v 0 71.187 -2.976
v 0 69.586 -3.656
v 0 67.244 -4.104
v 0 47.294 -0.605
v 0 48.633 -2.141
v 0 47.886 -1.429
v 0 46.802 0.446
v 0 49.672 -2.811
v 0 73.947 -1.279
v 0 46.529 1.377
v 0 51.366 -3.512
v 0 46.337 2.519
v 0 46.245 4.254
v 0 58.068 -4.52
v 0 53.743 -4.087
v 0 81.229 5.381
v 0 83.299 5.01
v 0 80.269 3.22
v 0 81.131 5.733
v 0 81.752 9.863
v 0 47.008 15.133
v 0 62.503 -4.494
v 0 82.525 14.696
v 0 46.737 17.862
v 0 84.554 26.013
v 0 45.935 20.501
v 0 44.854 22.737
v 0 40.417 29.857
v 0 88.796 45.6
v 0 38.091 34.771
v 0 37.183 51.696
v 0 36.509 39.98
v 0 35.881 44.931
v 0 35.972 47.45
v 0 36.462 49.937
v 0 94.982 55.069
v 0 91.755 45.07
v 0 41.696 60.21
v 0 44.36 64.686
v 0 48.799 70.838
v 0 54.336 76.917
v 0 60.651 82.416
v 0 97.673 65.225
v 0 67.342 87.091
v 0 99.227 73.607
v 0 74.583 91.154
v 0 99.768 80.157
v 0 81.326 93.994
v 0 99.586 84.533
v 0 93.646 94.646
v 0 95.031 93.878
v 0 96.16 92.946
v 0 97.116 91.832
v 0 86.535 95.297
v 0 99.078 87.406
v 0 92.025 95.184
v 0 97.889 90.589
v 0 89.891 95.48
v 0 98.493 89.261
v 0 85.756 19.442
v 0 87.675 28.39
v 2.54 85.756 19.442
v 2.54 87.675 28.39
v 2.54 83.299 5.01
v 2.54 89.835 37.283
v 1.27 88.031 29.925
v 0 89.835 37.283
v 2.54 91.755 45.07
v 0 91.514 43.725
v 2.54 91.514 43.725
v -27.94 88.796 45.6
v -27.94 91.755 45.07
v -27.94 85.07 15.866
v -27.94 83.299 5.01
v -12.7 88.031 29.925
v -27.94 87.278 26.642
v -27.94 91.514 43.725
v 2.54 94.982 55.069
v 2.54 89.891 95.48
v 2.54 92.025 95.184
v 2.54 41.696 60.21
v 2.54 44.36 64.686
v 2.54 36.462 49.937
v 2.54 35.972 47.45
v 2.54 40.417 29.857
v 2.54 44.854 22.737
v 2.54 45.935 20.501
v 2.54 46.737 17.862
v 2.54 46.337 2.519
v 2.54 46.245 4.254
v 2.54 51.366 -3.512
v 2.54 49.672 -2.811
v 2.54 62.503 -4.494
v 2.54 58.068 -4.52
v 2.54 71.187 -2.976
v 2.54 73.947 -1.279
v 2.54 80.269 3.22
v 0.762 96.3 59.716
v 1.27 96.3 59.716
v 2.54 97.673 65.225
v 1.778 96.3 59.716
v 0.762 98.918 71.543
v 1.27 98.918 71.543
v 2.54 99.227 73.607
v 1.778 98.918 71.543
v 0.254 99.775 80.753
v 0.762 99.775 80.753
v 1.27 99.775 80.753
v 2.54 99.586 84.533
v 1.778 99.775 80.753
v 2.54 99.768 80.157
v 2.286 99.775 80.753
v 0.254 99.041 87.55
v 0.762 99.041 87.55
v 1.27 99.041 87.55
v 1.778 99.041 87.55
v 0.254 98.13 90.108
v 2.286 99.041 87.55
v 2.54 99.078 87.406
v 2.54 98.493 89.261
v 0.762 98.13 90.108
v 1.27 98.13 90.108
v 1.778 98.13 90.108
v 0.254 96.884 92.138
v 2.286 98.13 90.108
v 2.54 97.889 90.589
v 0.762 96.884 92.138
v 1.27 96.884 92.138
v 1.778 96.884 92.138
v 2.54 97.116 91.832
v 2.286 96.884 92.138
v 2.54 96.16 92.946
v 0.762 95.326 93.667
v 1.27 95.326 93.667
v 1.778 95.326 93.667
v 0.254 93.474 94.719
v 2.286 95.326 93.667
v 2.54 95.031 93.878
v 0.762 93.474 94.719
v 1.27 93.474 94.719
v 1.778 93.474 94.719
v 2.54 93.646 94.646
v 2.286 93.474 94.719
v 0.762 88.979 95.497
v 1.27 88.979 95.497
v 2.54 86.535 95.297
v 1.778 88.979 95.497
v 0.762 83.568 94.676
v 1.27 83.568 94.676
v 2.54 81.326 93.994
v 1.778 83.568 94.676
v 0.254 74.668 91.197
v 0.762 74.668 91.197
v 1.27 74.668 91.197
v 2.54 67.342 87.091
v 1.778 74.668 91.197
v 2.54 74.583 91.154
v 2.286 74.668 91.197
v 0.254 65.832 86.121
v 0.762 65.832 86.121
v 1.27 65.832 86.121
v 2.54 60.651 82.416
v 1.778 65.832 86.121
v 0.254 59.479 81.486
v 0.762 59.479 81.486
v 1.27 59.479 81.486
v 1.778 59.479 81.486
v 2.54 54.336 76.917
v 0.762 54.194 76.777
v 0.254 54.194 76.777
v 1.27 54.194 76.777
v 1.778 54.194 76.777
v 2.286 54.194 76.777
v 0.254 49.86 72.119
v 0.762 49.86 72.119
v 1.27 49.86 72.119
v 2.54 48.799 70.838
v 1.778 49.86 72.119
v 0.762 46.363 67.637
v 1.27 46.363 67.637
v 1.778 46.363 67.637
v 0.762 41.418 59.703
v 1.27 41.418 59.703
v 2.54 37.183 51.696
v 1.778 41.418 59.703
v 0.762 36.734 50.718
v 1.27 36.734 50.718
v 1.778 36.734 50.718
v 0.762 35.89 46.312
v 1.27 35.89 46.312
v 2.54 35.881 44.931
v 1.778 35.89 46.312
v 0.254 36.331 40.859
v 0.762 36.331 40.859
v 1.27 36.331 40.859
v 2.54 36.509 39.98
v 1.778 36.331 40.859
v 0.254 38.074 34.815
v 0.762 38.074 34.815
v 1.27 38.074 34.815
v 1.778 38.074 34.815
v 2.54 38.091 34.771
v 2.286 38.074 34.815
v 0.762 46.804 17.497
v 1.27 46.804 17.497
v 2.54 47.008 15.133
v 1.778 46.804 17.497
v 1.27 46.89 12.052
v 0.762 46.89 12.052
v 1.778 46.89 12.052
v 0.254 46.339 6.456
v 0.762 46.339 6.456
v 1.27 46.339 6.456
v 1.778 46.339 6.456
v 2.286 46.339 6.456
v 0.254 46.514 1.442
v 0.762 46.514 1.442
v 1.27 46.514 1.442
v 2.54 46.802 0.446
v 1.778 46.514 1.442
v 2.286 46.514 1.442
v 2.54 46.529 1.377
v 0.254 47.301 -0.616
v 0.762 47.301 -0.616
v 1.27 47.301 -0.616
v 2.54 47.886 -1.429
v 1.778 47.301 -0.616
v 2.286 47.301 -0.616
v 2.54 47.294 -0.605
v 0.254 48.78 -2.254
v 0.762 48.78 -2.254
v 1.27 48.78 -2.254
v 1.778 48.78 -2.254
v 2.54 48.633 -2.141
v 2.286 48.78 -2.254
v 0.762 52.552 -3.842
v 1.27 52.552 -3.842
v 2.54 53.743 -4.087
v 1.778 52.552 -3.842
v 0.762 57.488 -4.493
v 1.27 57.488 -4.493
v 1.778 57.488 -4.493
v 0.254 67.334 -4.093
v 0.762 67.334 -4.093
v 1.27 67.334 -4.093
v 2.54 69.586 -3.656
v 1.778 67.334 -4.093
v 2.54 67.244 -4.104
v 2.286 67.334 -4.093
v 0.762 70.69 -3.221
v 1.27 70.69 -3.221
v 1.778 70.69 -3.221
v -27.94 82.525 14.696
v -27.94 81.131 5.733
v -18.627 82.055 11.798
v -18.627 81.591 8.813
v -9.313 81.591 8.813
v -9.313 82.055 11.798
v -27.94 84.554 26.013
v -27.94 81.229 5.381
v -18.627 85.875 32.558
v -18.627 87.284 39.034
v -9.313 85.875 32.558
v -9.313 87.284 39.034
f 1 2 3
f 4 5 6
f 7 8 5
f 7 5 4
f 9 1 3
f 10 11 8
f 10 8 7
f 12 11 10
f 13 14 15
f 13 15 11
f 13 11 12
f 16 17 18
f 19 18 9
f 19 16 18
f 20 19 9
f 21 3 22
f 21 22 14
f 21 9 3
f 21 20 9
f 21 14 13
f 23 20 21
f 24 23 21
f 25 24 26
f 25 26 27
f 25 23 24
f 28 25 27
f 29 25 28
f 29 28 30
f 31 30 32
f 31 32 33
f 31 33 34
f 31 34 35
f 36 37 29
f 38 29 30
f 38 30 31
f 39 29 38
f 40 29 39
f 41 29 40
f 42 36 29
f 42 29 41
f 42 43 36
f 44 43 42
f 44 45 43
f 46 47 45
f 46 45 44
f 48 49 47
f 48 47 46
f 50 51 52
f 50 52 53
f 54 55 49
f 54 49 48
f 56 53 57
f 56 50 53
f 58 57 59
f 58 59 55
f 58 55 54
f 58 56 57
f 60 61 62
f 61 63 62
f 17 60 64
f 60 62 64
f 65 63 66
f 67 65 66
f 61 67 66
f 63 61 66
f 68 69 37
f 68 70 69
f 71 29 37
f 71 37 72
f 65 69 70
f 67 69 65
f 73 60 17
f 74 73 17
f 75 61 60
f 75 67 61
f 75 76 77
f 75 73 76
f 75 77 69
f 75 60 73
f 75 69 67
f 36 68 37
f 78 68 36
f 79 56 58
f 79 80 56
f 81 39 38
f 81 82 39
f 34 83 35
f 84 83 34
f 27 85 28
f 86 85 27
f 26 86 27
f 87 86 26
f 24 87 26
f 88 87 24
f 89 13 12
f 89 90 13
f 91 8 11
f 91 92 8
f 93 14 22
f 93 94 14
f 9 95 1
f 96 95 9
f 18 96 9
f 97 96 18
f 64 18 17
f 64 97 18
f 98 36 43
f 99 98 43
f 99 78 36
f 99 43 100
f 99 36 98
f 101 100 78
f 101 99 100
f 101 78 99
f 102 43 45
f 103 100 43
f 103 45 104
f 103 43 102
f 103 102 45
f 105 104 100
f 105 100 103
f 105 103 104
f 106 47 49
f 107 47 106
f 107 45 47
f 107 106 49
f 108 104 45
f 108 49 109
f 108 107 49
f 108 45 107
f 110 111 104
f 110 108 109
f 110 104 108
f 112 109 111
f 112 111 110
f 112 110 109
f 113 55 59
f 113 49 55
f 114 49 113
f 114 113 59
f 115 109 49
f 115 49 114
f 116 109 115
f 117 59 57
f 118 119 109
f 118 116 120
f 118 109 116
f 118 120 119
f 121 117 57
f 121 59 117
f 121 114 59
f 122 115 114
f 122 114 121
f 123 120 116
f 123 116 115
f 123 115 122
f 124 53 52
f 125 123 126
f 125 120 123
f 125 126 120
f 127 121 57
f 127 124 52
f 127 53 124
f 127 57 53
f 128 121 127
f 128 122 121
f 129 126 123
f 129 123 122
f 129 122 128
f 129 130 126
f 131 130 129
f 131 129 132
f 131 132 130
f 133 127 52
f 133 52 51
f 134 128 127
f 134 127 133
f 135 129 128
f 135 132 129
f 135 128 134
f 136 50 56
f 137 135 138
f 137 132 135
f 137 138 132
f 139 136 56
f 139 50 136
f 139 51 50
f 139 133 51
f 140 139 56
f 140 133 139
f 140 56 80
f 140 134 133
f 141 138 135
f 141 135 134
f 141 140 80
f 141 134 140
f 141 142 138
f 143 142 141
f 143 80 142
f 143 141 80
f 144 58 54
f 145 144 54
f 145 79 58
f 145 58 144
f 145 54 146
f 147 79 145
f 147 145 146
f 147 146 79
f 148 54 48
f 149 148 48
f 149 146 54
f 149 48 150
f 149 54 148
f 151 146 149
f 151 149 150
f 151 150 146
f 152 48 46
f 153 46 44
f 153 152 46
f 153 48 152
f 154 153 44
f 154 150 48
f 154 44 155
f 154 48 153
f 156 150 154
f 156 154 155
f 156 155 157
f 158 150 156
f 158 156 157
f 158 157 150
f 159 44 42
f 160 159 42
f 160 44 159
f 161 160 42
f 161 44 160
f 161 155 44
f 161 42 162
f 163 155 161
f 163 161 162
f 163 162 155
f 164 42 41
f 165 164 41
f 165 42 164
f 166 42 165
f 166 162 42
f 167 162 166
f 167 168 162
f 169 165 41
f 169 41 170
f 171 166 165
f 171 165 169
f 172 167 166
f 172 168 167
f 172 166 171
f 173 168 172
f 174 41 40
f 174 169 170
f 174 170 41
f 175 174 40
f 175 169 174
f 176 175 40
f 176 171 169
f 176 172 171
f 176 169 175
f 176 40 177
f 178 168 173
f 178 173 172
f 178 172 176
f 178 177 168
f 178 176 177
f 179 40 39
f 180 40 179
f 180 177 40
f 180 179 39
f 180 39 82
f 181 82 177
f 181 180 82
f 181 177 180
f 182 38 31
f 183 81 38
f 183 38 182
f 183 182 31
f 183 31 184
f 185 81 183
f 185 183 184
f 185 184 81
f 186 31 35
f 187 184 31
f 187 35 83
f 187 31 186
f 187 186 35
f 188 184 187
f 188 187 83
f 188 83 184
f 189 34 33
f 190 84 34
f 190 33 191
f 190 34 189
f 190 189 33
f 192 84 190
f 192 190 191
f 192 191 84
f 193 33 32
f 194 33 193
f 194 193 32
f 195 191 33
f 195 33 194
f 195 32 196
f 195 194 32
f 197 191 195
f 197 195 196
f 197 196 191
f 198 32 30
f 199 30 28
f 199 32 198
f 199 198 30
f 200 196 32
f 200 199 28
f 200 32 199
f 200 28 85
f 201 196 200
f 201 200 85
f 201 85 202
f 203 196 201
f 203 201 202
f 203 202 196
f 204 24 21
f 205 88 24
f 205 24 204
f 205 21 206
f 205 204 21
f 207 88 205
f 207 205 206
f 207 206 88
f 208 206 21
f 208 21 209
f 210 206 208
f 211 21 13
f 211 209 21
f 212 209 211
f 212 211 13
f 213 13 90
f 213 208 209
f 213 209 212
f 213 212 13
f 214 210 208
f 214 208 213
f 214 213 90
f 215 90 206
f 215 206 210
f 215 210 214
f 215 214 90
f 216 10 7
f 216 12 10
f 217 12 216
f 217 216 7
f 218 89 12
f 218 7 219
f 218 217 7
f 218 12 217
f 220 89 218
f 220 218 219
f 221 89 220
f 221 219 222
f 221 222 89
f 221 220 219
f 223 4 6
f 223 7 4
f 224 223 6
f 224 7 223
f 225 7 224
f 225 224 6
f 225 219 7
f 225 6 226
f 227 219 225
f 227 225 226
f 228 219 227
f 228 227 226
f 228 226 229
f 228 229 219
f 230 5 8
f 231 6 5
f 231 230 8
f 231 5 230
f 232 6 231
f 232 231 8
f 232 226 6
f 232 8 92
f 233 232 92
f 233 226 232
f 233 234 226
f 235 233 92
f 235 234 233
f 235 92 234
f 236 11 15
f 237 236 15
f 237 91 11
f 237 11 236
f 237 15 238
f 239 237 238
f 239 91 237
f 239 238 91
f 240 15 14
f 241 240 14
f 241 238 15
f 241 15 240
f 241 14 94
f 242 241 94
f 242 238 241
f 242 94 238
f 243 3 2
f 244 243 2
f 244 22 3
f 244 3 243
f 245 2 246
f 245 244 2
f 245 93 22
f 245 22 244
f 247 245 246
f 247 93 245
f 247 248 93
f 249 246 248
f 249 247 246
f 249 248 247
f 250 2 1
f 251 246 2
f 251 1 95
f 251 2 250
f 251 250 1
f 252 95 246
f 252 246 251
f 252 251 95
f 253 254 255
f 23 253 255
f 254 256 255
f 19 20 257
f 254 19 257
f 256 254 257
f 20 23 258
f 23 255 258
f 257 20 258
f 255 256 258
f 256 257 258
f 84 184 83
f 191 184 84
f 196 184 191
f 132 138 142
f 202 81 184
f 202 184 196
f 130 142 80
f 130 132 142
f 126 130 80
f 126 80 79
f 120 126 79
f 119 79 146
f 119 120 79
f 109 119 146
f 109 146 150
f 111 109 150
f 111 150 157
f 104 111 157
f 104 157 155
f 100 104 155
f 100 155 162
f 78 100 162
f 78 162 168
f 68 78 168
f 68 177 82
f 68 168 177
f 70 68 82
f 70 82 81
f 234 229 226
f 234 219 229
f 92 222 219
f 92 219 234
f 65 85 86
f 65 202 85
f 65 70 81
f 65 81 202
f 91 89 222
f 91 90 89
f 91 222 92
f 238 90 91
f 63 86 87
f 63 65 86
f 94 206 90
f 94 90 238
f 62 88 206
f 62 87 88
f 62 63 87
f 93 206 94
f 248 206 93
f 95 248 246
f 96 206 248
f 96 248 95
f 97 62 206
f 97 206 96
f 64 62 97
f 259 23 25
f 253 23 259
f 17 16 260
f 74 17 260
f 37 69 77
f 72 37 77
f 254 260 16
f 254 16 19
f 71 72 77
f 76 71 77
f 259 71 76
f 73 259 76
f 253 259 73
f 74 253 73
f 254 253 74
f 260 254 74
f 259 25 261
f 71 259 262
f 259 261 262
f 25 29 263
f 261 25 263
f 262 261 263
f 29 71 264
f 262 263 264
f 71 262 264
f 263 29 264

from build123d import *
from OCP.BRepAlgoAPI import BRepAlgoAPI_Cut
from OCP.TopTools import TopTools_ListOfShape

# Parameters (mm, degrees)
SKETCH5_W               = 81.787290023
SKETCH5_H               = 56.904635677
BOSS_EXTRUDE4_DEPTH     = 2.54
SKETCH8_W               = 27.940001339
SKETCH8_H               = 40.923748046
BOSS_EXTRUDE5_DEPTH     = 3.725366
CUT_EXTRUDE1_DEPTH      = 126.746493029
CUT_EXTRUDE1_DEPTH_BACK = 126.746493029
CUT_EXTRUDE2_DEPTH      = 127.33513904
CUT_EXTRUDE2_DEPTH_BACK = 127.33513904
BOSS_EXTRUDE6_REACH     = 128.584
SKETCH12_W              = 2.54
SKETCH12_H              = 35.085594769
BOSS_EXTRUDE7_REACH     = 73.221
SKETCH13_W              = 2.54
SKETCH13_H              = 27.369624292
BOSS_EXTRUDE8_REACH     = 111.618
SKETCH14_W              = 2.54
SKETCH14_H              = 37.73907017
BOSS_EXTRUDE9_REACH     = 134.62
BOSS_EXTRUDE10_REACH    = 73.568
SKETCH16_W              = 2.54
SKETCH16_H              = 4.106837018
CUT_EXTRUDE4_DEPTH      = 126.746493188
CUT_EXTRUDE4_DEPTH_BACK = 126.746493188
BOSS_EXTRUDE11_DEPTH    = 2.54
CUT_EXTRUDE5_DEPTH      = 176.067996905
CUT_EXTRUDE5_DEPTH_BACK = 176.067996905
SKETCH20_OUTSIDE_W      = 160.933
SKETCH20_OUTSIDE_H      = 133.978


with BuildPart() as part:
    # Sketch5 → Boss-Extrude4 (new body)
    with BuildSketch(Plane(origin=(0, 0, 0), x_dir=(0, 0, -1), z_dir=(1, 0, 0))):
        with Locations((-36.147875746, 66.92137305)):
            Rectangle(SKETCH5_W, SKETCH5_H)
    extrude(amount=BOSS_EXTRUDE4_DEPTH)

    # Sketch8 → Boss-Extrude5 (add)
    with BuildSketch(Plane(origin=(0, 77.402413142, -13.876271299), x_dir=(-1, 0, 0), z_dir=(0, -0.9843076044334547, 0.17646115678662544))):
        with Locations((13.97000067, -40.091856962)):
            Rectangle(SKETCH8_W, SKETCH8_H)
    extrude(amount=-BOSS_EXTRUDE5_DEPTH)

    # Sketch10 → Cut-Extrude1 (cut, two sides: drawn at the far end of the back side and taken through both)
    with BuildSketch(Plane(origin=(0, 0, 0), x_dir=(0, 0, -1), z_dir=(1, 0, 0)).offset(-CUT_EXTRUDE1_DEPTH_BACK)):
        with BuildLine():
            Line((-40.242521464, 96.388231012), (-45.049448936, 91.866554616))
            add(Edge.make_bspline(
                [(-45.049448936, 91.866554616), (-40.025208831, 90.523842434), (-26.810283978, 87.100327552), (-13.367287816, 84.471736542), (-5.009519635, 83.299208369)],
                knots=[0, 0, 0, 0, 0.380899762, 1, 1, 1, 1], degree=3))
            Line((-5.009519635, 83.299208369), (0.750455987, 86.657878486))
            Line((0.750455987, 86.657878486), (-40.242521464, 96.388231012))
        make_face()
    extrude(amount=CUT_EXTRUDE1_DEPTH + CUT_EXTRUDE1_DEPTH_BACK, mode=Mode.SUBTRACT)

    # Sketch11 → Cut-Extrude2 (cut, two sides: drawn at the far end of the back side and taken through both)
    with BuildSketch(Plane.ZY.offset(27.940001339).offset(-CUT_EXTRUDE2_DEPTH_BACK)):
        with BuildLine():
            Line((53.455872179, 90.683446735), (30.686323775, 63.989877738))
            Line((30.686323775, 63.989877738), (2.256807619, 78.898821665))
            Line((2.256807619, 78.898821665), (3.827754532, 81.664020072))
            Line((3.827754532, 81.664020072), (5.732550457, 81.13087175))
            add(Edge.make_bspline(
                [(5.732550457, 81.13087175), (24.123226432, 83.821086616), (37.047064255, 86.680580039), (53.455872179, 90.683446735)],
                knots=[0, 0, 0, 0, 1, 1, 1, 1], degree=3))
        make_face()
    extrude(amount=CUT_EXTRUDE2_DEPTH + CUT_EXTRUDE2_DEPTH_BACK, mode=Mode.SUBTRACT)

    # Sketch12 → Boss-Extrude6 (add, up to next)
    with BuildSketch(Plane(origin=(0, 11.798984957, -13.832378819), x_dir=(-1, 0, 0), z_dir=(0, 0.6489714241172663, -0.760812782936254)), mode=Mode.PRIVATE) as boss_extrude6_sk1:
        with Locations((-1.27, 86.141661588)):
            Rectangle(SKETCH12_W, SKETCH12_H)
    boss_extrude6_tool1 = extrude(boss_extrude6_sk1.sketch, amount=BOSS_EXTRUDE6_REACH, mode=Mode.PRIVATE) - part.part
    add(boss_extrude6_tool1.solids().sort_by_distance((1.27, 77.336662, 42.071098))[0])

    # Sketch13 → Boss-Extrude7 (add, up to next)
    with BuildSketch(Plane(origin=(0, 52.19089278, 44.518702594), x_dir=(1, 0, 0), z_dir=(0, -0.760812782936254, -0.6489714241172663)), mode=Mode.PRIVATE) as boss_extrude7_sk1:
        with Locations((1.27, -31.865866841)):
            Rectangle(SKETCH13_W, SKETCH13_H)
    boss_extrude7_tool1 = extrude(boss_extrude7_sk1.sketch, amount=BOSS_EXTRUDE7_REACH, mode=Mode.PRIVATE) - part.part
    add(boss_extrude7_tool1.solids().sort_by_distance((1.27, 72.87093, 20.274744))[0])

    # Sketch14 → Boss-Extrude8 (add, up to next)
    with BuildSketch(Plane(origin=(0, 82.204388232, -19.512553769), x_dir=(1, 0, 0), z_dir=(0, -0.9729657825072627, 0.2309493149373473)), mode=Mode.PRIVATE) as boss_extrude8_sk1:
        with Locations((1.27, 38.152944758)):
            Rectangle(SKETCH14_W, SKETCH14_H)
    boss_extrude8_tool1 = extrude(boss_extrude8_sk1.sketch, amount=BOSS_EXTRUDE8_REACH, mode=Mode.PRIVATE) - part.part
    add(boss_extrude8_tool1.solids().sort_by_distance((1.27, 91.015785, 17.608956))[0])

    # Boss-Extrude9: up to this plane
    boss_extrude9_end = Plane(origin=(2.54, 78.898821665, 2.256807619), z_dir=(0, 0.4939645898590634, -0.8694820204957474))
    # Sketch15 → Boss-Extrude9 (add, up to the surface)
    with BuildSketch(Plane(origin=(0, 29.561089012, -34.655538845), x_dir=(-1, 0, 0), z_dir=(0, 0.6489714241172663, -0.760812782936254)), mode=Mode.PRIVATE) as boss_extrude9_sk1:
        Polygon((-2.54, 62.385269317), (0, 62.385269317), (0, 68.598864198), (-2.54, 68.598864203), align=None)
    boss_extrude9_tool1 = split(extrude(boss_extrude9_sk1.sketch, amount=BOSS_EXTRUDE9_REACH, mode=Mode.PRIVATE), bisect_by=boss_extrude9_end, keep=Keep.BOTH, mode=Mode.PRIVATE)
    add(boss_extrude9_tool1.solids().sort_by_distance((1.27, 79.388291, 7.846941))[0])

    # Sketch16 → Boss-Extrude10 (add, up to next)
    with BuildSketch(Plane(origin=(0, 47.463510363, 40.486257073), x_dir=(1, 0, 0), z_dir=(1.7728912829201935e-15, -0.7608127829362537, -0.6489714241172665)), mode=Mode.PRIVATE) as boss_extrude10_sk1:
        with Locations((1.27, -47.604097496)):
            Rectangle(SKETCH16_W, SKETCH16_H)
    boss_extrude10_tool1 = extrude(boss_extrude10_sk1.sketch, amount=BOSS_EXTRUDE10_REACH, mode=Mode.PRIVATE) - part.part
    add(boss_extrude10_tool1.solids().sort_by_distance((1.27, 78.357209, 4.268451))[0])


with BuildPart() as cut_extrude4_tool:
    # Sketch17 → Cut-Extrude4 (new, two sides: drawn at the far end of the back side and taken through both)
    with BuildSketch(Plane.ZY.offset(-CUT_EXTRUDE4_DEPTH_BACK)):
        with BuildLine():
            Line((45.069844132, 91.75470098), (45.668000854, 102.56574737))
            Line((45.668000854, 102.56574737), (-10.169635765, 101.194481381))
            Line((-10.169635765, 101.194481381), (-11.297413525, 80.811098173))
            Line((-11.297413525, 80.811098173), (5.009519635, 83.299208369))
            add(Edge.make_bspline(
                [(37.283058909, 89.835032689), (34.836356296, 89.212401727), (24.175537631, 86.585139533), (13.367287816, 84.471736542), (5.009519635, 83.299208369)],
                knots=[0.195993982, 0.195993982, 0.195993982, 0.195993982, 0.380899762, 1, 1, 1, 1], degree=3))
            Line((37.283058909, 89.835032689), (41.348755126, 93.900728906))
            Line((41.348755126, 93.900728906), (43.724942227, 91.513594496))
            Line((43.724942227, 91.513594496), (45.069844132, 91.75470098))
        make_face()
    extrude(amount=CUT_EXTRUDE4_DEPTH + CUT_EXTRUDE4_DEPTH_BACK)


with BuildPart() as part_1:
    add(part.part)

    # Cut-Extrude4: cut by cut_extrude4_tool, with a tolerance
    cut_extrude4_stock = TopTools_ListOfShape()
    cut_extrude4_stock.Append(part_1.part.wrapped)
    cut_extrude4_tools = TopTools_ListOfShape()
    cut_extrude4_tools.Append(cut_extrude4_tool.part.wrapped)
    cut_extrude4_cut = BRepAlgoAPI_Cut()
    cut_extrude4_cut.SetArguments(cut_extrude4_stock)
    cut_extrude4_cut.SetTools(cut_extrude4_tools)
    cut_extrude4_cut.SetFuzzyValue(0.00001)
    cut_extrude4_cut.Build()
    add(Compound.cast(cut_extrude4_cut.Shape()).solids(), mode=Mode.REPLACE)

    # Sketch18 → Boss-Extrude11 (add)
    with BuildSketch(Plane.ZY):
        Polygon((47.575270178, 38.469055211), (45.823592432, 95.373690888), (45.045739537, 120.642856825), (118.790200904, 122.9129097), (121.493112727, 35.106683347), (47.575270178, 25.583905436), (31.914373272, 23.629088449), (31.914373272, 38.469055211), align=None)
    extrude(amount=-BOSS_EXTRUDE11_DEPTH)

    # Sketch20 outside → Cut-Extrude5 (cut, two sides: drawn at the far end of the back side and taken through both)
    with BuildSketch(Plane.ZY.offset(-CUT_EXTRUDE5_DEPTH_BACK)):
        with Locations((58.3735, 73.271)):
            Rectangle(SKETCH20_OUTSIDE_W, SKETCH20_OUTSIDE_H)
        with BuildLine():
            Line((5.009519635, 83.299208369), (3.96643719, 97.862894814))
            Line((3.96643719, 97.862894814), (45.069859962, 91.75461268))
            add(Edge.make_bspline(
                [(45.069859962, 91.75461268), (88.06671598, 106.598547486), (102.698921653, 96.352532959), (78.234192741, 49.115395141), (56.338800129, 40.133848451), (47.639419335, 34.459384276), (32.872594978, 36.782655684), (16.418610546, 50.57398562), (-5.600424532, 40.534614125), (-4.678510468, 63.68810403), (-3.362124029, 72.336771532), (3.144032383, 79.3685972), (5.009519635, 83.299208369)],
                knots=[0, 0, 0, 0, 0.141853326, 0.193044775, 0.364594631, 0.404896474, 0.59606321, 0.678759645, 0.810881607, 0.912493474, 0.931405313, 1, 1, 1, 1], degree=3))
        make_face(mode=Mode.SUBTRACT)
    extrude(amount=CUT_EXTRUDE5_DEPTH + CUT_EXTRUDE5_DEPTH_BACK, mode=Mode.SUBTRACT)


solid = part_1.part
